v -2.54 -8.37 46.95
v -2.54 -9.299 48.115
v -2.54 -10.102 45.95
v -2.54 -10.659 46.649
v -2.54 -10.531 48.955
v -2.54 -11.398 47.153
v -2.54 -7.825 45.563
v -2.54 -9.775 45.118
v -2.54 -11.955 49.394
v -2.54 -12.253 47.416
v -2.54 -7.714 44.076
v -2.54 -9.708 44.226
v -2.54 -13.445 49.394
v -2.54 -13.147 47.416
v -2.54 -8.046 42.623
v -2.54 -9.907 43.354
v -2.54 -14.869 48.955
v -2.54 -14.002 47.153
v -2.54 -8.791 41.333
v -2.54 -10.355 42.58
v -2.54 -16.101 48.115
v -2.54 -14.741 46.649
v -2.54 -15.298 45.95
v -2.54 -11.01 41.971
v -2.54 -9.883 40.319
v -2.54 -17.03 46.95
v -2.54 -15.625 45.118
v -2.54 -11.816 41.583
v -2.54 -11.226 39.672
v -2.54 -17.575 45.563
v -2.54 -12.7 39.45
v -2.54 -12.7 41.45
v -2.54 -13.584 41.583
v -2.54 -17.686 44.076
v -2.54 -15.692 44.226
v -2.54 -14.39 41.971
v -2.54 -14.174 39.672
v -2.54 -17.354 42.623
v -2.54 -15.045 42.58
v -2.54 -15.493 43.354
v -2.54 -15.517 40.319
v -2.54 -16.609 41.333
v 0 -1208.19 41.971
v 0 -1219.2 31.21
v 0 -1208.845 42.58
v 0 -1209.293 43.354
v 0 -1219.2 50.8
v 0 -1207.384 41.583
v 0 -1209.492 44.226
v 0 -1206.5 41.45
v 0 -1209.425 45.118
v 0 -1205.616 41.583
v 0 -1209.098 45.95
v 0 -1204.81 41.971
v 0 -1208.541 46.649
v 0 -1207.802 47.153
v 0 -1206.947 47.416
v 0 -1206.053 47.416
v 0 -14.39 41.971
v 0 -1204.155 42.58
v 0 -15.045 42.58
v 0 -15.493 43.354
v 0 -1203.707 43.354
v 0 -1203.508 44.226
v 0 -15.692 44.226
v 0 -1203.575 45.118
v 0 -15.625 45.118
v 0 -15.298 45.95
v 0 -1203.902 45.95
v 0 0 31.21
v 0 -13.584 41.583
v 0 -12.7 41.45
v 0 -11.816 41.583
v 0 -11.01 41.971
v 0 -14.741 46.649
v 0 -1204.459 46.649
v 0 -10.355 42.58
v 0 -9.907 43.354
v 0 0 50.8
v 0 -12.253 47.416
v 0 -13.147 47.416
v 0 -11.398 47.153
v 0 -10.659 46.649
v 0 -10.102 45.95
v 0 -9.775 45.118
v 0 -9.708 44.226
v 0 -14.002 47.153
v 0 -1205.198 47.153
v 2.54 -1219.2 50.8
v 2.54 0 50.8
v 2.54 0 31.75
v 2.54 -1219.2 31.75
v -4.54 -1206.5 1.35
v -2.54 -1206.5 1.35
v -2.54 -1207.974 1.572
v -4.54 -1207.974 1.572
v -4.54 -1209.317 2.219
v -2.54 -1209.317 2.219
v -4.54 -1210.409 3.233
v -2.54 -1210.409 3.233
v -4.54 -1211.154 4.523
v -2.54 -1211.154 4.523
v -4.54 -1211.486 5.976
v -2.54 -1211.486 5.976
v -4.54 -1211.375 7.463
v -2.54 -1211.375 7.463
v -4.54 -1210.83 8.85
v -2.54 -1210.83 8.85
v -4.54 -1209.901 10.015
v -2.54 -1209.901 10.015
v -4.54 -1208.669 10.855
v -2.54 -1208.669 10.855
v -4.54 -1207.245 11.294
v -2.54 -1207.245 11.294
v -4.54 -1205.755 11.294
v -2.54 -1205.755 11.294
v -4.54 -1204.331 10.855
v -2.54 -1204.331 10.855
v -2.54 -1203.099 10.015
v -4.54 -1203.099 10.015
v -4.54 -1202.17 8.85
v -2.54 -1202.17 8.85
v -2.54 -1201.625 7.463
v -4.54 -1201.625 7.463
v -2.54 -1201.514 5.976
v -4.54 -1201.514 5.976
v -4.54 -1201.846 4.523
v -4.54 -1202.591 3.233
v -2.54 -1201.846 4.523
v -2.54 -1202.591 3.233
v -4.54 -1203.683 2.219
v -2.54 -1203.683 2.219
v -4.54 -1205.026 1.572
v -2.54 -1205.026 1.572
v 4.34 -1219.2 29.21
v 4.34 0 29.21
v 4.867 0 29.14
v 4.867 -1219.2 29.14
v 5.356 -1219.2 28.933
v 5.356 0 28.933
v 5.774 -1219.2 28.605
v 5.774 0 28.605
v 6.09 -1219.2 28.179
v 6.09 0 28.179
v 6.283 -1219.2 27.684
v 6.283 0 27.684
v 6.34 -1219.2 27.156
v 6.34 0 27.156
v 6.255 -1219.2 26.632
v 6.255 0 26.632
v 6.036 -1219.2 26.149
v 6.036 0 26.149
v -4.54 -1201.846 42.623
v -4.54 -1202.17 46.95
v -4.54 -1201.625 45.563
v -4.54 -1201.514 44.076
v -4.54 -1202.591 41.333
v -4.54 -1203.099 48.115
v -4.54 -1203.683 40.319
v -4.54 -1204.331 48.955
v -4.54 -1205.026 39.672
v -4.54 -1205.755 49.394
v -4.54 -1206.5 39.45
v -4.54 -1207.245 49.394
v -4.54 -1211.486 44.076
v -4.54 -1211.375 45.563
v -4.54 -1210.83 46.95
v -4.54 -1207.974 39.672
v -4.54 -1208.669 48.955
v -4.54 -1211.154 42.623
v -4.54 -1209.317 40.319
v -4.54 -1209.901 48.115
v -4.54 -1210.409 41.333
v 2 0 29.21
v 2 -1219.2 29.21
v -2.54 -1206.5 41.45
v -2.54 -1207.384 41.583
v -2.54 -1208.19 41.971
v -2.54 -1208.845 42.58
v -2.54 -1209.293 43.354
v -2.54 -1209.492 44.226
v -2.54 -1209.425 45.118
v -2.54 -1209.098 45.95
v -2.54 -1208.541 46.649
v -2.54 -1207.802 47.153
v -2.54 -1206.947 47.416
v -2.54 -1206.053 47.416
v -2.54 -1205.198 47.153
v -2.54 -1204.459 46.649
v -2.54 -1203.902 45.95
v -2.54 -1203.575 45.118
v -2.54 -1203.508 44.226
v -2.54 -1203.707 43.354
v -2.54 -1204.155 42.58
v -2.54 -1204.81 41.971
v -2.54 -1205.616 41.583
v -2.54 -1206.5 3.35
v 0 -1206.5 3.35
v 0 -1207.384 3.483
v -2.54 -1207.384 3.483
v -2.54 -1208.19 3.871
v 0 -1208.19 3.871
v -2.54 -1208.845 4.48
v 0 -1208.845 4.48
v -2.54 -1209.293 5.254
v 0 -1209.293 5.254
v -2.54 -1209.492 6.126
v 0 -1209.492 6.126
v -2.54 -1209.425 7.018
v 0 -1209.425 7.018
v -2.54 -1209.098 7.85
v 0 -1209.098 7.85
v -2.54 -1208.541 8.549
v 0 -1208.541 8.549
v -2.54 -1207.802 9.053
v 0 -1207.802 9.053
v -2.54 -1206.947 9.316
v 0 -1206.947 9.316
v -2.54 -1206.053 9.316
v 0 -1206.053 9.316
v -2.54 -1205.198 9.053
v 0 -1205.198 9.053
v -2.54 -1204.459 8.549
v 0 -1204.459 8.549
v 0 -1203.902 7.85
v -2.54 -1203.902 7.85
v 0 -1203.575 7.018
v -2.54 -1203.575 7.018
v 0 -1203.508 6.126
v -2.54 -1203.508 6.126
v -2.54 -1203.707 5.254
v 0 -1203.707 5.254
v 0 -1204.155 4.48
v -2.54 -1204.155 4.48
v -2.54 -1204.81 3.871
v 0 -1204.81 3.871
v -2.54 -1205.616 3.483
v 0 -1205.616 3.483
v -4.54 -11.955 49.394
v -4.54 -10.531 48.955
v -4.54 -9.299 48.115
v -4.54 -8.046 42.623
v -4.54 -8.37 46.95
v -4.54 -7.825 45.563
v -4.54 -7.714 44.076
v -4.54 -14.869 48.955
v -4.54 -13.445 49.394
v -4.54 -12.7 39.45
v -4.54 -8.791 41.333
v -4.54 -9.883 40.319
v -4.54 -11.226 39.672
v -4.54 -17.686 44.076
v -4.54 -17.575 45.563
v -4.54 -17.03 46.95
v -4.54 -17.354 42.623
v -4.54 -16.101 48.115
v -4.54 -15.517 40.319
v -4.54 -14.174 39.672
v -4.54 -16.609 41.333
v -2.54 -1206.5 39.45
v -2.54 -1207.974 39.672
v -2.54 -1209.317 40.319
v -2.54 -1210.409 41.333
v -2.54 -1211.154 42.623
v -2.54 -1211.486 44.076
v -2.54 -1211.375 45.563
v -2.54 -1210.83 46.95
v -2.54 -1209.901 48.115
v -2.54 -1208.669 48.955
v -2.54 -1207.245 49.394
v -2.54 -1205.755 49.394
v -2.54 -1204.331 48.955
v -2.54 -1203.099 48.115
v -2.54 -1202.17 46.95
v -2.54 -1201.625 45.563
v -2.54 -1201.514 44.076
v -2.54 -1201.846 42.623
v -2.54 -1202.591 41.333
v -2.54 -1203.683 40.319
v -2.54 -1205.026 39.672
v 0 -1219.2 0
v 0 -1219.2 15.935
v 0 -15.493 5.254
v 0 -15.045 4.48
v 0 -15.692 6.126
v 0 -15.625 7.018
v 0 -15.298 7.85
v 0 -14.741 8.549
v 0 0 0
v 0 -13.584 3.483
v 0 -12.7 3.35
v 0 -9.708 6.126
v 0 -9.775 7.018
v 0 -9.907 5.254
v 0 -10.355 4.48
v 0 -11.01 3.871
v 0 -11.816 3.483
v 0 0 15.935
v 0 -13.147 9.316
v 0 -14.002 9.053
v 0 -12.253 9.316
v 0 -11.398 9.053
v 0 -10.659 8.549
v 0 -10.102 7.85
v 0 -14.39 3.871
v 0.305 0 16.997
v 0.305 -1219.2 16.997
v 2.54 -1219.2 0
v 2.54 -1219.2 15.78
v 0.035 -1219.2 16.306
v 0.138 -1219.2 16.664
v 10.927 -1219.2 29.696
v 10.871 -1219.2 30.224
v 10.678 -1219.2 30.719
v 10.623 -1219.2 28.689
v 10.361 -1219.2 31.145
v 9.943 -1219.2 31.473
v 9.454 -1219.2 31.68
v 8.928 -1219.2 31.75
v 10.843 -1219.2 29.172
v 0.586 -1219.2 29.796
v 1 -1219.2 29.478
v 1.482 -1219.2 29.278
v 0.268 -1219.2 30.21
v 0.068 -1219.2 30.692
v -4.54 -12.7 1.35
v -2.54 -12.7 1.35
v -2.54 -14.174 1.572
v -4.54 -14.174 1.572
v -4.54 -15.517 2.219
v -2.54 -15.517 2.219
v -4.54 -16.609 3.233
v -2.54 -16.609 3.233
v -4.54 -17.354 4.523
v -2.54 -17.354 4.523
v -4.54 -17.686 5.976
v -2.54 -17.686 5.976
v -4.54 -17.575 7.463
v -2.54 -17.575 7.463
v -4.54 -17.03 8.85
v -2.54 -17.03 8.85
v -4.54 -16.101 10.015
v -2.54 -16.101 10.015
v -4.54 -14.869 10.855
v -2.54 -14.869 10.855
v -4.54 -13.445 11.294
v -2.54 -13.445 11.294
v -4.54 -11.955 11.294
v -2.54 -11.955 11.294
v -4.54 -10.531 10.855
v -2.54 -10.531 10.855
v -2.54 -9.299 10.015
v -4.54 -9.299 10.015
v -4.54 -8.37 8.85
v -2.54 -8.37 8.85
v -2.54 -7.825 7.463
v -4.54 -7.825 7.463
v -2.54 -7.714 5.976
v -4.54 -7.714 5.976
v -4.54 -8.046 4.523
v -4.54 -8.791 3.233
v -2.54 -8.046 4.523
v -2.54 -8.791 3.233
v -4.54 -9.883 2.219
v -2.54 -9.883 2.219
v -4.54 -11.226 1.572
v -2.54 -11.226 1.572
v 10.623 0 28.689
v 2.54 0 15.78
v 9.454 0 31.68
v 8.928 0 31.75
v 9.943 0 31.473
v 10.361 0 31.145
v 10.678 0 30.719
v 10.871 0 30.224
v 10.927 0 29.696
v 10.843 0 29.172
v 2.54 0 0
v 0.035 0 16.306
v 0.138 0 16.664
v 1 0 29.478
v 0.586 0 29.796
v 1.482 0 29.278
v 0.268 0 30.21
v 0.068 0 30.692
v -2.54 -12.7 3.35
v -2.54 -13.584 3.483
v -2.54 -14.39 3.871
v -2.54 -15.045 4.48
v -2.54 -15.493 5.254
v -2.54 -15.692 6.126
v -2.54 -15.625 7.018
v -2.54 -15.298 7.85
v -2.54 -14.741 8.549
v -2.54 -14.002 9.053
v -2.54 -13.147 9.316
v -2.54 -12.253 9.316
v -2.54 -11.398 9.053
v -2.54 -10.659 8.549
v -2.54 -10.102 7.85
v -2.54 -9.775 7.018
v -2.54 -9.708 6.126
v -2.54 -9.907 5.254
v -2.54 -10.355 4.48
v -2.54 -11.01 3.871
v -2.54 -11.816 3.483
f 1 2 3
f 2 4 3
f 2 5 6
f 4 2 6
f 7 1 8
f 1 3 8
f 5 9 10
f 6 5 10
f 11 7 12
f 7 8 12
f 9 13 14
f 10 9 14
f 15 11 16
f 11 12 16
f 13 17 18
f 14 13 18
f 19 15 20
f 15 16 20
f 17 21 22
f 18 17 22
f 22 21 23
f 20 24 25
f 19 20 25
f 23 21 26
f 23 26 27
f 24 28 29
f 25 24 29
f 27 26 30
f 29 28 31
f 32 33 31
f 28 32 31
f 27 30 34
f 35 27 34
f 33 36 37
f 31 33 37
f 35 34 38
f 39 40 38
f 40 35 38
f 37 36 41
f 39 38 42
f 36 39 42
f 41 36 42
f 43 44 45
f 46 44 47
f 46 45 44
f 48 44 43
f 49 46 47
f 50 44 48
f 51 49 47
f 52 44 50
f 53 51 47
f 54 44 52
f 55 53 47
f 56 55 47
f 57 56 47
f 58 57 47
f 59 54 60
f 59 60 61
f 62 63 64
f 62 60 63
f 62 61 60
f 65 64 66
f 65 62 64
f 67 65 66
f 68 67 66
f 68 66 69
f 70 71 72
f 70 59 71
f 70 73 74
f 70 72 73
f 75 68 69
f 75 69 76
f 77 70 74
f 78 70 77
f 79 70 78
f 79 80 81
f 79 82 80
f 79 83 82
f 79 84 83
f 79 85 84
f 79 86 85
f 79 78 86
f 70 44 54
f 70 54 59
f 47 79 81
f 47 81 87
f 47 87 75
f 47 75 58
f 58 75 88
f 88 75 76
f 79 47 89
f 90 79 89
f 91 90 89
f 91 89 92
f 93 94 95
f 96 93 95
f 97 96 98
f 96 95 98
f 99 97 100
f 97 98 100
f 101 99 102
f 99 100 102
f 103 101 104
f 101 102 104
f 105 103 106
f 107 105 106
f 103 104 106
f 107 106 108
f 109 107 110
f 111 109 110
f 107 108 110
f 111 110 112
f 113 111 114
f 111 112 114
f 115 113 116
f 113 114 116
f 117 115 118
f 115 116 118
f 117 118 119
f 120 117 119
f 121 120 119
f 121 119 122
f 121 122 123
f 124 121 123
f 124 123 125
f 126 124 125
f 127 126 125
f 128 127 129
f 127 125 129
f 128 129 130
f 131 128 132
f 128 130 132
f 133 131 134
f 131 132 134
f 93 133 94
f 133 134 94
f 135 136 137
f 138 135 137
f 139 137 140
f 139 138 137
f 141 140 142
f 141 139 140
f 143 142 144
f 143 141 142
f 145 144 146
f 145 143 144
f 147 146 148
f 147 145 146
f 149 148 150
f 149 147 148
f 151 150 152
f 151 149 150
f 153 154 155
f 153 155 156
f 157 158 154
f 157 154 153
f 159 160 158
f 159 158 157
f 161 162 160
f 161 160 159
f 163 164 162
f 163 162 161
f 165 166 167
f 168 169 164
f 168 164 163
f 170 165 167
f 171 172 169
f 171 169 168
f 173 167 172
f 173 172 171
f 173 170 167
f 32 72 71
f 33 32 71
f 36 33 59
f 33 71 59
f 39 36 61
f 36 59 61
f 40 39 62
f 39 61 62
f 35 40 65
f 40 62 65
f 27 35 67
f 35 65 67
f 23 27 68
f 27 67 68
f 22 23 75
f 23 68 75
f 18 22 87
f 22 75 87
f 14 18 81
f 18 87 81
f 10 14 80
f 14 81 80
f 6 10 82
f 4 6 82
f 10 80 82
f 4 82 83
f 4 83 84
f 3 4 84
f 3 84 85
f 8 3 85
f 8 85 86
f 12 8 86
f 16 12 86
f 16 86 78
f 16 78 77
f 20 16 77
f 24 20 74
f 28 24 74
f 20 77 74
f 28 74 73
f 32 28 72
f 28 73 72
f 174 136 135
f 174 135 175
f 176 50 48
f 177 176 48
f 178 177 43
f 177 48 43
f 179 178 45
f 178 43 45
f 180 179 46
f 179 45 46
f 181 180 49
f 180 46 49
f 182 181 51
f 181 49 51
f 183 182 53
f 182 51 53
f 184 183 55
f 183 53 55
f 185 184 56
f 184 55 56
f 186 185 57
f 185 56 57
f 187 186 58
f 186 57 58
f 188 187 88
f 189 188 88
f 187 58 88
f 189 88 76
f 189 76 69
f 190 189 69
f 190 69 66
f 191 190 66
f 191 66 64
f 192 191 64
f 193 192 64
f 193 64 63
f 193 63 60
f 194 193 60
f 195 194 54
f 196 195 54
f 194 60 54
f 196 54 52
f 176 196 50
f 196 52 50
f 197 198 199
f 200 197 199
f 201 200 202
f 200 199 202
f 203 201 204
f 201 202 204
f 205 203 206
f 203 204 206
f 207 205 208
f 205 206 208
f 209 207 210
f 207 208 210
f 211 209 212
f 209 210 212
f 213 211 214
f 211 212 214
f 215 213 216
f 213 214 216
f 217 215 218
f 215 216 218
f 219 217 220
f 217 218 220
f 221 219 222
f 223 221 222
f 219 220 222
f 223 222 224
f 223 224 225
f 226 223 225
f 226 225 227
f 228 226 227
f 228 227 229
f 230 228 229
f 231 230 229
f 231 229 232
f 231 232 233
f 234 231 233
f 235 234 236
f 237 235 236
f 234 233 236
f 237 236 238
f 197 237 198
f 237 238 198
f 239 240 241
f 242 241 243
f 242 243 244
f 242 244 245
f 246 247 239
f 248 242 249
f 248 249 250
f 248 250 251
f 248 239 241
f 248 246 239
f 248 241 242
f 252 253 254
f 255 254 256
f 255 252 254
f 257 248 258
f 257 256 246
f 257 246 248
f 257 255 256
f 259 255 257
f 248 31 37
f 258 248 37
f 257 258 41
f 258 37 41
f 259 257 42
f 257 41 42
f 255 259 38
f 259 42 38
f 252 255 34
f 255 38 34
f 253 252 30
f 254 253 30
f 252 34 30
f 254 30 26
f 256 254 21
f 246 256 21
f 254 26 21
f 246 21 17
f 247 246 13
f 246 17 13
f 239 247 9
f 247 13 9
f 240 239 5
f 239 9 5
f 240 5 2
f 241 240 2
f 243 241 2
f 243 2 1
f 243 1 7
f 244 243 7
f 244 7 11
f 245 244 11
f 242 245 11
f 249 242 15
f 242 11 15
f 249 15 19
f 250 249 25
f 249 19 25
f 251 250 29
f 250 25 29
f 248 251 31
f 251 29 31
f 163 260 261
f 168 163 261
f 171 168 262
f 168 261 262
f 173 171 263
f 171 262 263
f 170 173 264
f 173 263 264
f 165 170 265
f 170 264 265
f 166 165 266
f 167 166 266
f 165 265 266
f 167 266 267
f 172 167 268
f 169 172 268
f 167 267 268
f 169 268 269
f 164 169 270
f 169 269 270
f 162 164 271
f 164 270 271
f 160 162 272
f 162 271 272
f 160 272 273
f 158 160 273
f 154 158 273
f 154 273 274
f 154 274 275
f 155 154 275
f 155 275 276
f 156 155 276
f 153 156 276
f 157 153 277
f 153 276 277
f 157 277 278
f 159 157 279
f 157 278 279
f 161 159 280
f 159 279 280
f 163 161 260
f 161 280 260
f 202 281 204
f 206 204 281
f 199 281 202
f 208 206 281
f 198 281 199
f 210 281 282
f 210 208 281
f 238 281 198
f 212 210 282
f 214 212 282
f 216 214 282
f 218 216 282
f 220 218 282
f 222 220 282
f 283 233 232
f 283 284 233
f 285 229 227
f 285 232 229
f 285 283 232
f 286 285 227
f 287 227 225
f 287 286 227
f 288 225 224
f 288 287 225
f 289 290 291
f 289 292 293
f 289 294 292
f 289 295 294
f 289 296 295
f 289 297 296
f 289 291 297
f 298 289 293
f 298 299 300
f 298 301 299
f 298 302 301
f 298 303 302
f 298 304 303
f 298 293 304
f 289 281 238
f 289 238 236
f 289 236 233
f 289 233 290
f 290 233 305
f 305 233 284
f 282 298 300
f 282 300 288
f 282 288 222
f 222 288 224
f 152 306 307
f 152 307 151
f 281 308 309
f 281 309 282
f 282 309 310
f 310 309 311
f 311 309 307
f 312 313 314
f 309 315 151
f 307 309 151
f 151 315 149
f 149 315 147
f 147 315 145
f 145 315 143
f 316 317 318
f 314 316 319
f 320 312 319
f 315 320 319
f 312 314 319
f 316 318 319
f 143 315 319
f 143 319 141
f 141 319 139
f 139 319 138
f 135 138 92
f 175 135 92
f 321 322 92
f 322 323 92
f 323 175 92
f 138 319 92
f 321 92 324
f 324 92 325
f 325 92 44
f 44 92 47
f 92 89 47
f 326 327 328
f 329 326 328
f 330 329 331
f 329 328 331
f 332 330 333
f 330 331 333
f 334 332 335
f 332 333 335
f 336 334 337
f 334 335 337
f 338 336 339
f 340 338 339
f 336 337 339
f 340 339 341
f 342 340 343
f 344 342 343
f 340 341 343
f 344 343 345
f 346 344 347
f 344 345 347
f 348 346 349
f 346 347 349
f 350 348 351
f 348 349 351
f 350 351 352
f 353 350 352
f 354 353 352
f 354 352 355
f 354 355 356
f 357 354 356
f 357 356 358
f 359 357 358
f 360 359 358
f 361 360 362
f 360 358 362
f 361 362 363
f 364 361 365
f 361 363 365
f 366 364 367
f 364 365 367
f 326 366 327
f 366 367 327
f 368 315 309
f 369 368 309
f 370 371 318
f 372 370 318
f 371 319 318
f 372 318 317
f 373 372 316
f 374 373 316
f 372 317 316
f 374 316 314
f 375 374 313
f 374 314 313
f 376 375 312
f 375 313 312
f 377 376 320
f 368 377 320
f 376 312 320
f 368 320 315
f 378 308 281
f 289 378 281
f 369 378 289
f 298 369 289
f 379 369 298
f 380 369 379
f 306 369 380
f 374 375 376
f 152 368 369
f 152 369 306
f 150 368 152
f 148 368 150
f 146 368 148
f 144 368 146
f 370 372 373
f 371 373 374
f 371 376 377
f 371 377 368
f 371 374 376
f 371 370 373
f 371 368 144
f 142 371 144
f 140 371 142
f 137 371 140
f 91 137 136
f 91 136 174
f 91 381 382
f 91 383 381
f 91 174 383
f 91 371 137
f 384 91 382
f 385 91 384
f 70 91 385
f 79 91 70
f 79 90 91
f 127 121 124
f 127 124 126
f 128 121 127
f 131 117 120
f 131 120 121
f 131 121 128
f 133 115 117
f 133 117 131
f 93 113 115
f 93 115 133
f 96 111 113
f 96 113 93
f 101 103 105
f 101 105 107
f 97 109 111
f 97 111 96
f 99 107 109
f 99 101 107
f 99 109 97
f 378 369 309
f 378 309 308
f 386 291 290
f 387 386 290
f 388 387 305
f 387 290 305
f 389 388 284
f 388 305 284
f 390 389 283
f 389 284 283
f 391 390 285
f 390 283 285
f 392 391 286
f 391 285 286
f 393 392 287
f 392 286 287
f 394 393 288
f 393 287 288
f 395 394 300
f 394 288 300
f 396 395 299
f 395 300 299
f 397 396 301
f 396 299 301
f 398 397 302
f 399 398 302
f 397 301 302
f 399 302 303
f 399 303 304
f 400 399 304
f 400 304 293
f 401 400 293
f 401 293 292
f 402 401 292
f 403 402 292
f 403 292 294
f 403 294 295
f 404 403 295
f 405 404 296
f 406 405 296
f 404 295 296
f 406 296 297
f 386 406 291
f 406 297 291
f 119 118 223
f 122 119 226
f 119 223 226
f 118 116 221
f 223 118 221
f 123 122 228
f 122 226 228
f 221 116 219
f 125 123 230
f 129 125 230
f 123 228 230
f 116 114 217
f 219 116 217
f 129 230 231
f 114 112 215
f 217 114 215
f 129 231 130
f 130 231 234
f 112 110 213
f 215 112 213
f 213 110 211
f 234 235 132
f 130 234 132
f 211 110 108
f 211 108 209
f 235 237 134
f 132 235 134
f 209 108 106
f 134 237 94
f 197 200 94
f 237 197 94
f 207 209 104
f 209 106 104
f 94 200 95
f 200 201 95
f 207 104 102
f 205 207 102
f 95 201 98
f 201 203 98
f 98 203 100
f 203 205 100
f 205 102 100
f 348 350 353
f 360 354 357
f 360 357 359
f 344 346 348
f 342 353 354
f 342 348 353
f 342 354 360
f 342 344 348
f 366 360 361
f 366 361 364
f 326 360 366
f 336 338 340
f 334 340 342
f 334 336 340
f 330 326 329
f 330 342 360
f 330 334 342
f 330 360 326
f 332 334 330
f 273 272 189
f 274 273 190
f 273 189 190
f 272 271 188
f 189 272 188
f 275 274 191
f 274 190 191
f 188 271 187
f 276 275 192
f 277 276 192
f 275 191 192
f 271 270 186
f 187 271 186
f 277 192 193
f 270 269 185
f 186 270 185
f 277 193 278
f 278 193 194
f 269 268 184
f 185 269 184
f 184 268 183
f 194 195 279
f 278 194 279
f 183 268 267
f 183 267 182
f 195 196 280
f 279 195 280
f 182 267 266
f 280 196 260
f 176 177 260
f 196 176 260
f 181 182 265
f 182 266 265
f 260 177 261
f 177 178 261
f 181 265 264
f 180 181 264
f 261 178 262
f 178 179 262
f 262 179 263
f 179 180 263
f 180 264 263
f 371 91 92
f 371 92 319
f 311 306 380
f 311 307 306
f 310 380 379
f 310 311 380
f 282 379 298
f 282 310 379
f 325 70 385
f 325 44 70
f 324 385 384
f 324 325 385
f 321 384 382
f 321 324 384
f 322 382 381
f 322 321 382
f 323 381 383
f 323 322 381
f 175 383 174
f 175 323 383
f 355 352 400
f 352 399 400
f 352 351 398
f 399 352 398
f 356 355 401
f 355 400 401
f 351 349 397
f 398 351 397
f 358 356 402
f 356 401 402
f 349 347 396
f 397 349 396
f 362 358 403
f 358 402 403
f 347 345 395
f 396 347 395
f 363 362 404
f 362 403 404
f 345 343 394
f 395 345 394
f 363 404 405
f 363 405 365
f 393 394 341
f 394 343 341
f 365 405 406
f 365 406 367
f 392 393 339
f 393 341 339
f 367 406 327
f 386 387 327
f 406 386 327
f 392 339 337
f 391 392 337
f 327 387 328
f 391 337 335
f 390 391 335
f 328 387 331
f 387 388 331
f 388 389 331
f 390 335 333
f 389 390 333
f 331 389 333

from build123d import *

# Parameters (mm, degrees)
PAD_DEPTH    = 1219.2
SKETCH001_R  = 3
PAD001_DEPTH = 2.54
SKETCH002_R  = 5
PAD002_DEPTH = 2
FILLET_R     = 2


with BuildPart() as part:
    # Sketch → Pad (new body)
    with BuildSketch(Plane.XZ):
        Polygon((0, 0), (0, 16.51), (7.952592, 29.21), (0, 29.21), (0, 50.8), (2.54, 50.8), (2.54, 31.75), (12.54, 31.75), (2.54, 15.780364), (2.54, 0), align=None)
    extrude(amount=PAD_DEPTH)

    # Sketch001 (on Face4 of Pad) → Pad001 (join)
    with BuildSketch(Plane(origin=(0, 0, 0), x_dir=(0, 0, -1), z_dir=(-1, 0, 0))):
        with Locations((-44.45, 12.7)):
            Circle(SKETCH001_R)
        with Locations((-6.35, 12.7)):
            Circle(SKETCH001_R)
        with Locations((-44.45, 1206.5)):
            Circle(SKETCH001_R)
        with Locations((-6.35, 1206.5)):
            Circle(SKETCH001_R)
    extrude(amount=PAD001_DEPTH)

    # Sketch002 (on Face20 of Pad001) → Pad002 (join)
    with BuildSketch(Plane(origin=(-2.54, 0, 0), x_dir=(0, 0, -1), z_dir=(-1, 0, 0))):
        with Locations((-44.45, 12.7)):
            Circle(SKETCH002_R)
        with Locations((-6.35, 12.7)):
            Circle(SKETCH002_R)
        with Locations((-44.45, 1206.5)):
            Circle(SKETCH002_R)
        with Locations((-6.35, 1206.5)):
            Circle(SKETCH002_R)
    extrude(amount=PAD002_DEPTH)

    # Fillet
    fillet_edges = [part.edges().sort_by_distance(p)[0] for p in [
        (12.54, -609.6, 31.75),
        (0, -609.6, 29.21),
        (0, -609.6, 16.51),
        (7.952592, -609.6, 29.21),
    ]]
    fillet(fillet_edges, radius=FILLET_R)


solid = part.part
